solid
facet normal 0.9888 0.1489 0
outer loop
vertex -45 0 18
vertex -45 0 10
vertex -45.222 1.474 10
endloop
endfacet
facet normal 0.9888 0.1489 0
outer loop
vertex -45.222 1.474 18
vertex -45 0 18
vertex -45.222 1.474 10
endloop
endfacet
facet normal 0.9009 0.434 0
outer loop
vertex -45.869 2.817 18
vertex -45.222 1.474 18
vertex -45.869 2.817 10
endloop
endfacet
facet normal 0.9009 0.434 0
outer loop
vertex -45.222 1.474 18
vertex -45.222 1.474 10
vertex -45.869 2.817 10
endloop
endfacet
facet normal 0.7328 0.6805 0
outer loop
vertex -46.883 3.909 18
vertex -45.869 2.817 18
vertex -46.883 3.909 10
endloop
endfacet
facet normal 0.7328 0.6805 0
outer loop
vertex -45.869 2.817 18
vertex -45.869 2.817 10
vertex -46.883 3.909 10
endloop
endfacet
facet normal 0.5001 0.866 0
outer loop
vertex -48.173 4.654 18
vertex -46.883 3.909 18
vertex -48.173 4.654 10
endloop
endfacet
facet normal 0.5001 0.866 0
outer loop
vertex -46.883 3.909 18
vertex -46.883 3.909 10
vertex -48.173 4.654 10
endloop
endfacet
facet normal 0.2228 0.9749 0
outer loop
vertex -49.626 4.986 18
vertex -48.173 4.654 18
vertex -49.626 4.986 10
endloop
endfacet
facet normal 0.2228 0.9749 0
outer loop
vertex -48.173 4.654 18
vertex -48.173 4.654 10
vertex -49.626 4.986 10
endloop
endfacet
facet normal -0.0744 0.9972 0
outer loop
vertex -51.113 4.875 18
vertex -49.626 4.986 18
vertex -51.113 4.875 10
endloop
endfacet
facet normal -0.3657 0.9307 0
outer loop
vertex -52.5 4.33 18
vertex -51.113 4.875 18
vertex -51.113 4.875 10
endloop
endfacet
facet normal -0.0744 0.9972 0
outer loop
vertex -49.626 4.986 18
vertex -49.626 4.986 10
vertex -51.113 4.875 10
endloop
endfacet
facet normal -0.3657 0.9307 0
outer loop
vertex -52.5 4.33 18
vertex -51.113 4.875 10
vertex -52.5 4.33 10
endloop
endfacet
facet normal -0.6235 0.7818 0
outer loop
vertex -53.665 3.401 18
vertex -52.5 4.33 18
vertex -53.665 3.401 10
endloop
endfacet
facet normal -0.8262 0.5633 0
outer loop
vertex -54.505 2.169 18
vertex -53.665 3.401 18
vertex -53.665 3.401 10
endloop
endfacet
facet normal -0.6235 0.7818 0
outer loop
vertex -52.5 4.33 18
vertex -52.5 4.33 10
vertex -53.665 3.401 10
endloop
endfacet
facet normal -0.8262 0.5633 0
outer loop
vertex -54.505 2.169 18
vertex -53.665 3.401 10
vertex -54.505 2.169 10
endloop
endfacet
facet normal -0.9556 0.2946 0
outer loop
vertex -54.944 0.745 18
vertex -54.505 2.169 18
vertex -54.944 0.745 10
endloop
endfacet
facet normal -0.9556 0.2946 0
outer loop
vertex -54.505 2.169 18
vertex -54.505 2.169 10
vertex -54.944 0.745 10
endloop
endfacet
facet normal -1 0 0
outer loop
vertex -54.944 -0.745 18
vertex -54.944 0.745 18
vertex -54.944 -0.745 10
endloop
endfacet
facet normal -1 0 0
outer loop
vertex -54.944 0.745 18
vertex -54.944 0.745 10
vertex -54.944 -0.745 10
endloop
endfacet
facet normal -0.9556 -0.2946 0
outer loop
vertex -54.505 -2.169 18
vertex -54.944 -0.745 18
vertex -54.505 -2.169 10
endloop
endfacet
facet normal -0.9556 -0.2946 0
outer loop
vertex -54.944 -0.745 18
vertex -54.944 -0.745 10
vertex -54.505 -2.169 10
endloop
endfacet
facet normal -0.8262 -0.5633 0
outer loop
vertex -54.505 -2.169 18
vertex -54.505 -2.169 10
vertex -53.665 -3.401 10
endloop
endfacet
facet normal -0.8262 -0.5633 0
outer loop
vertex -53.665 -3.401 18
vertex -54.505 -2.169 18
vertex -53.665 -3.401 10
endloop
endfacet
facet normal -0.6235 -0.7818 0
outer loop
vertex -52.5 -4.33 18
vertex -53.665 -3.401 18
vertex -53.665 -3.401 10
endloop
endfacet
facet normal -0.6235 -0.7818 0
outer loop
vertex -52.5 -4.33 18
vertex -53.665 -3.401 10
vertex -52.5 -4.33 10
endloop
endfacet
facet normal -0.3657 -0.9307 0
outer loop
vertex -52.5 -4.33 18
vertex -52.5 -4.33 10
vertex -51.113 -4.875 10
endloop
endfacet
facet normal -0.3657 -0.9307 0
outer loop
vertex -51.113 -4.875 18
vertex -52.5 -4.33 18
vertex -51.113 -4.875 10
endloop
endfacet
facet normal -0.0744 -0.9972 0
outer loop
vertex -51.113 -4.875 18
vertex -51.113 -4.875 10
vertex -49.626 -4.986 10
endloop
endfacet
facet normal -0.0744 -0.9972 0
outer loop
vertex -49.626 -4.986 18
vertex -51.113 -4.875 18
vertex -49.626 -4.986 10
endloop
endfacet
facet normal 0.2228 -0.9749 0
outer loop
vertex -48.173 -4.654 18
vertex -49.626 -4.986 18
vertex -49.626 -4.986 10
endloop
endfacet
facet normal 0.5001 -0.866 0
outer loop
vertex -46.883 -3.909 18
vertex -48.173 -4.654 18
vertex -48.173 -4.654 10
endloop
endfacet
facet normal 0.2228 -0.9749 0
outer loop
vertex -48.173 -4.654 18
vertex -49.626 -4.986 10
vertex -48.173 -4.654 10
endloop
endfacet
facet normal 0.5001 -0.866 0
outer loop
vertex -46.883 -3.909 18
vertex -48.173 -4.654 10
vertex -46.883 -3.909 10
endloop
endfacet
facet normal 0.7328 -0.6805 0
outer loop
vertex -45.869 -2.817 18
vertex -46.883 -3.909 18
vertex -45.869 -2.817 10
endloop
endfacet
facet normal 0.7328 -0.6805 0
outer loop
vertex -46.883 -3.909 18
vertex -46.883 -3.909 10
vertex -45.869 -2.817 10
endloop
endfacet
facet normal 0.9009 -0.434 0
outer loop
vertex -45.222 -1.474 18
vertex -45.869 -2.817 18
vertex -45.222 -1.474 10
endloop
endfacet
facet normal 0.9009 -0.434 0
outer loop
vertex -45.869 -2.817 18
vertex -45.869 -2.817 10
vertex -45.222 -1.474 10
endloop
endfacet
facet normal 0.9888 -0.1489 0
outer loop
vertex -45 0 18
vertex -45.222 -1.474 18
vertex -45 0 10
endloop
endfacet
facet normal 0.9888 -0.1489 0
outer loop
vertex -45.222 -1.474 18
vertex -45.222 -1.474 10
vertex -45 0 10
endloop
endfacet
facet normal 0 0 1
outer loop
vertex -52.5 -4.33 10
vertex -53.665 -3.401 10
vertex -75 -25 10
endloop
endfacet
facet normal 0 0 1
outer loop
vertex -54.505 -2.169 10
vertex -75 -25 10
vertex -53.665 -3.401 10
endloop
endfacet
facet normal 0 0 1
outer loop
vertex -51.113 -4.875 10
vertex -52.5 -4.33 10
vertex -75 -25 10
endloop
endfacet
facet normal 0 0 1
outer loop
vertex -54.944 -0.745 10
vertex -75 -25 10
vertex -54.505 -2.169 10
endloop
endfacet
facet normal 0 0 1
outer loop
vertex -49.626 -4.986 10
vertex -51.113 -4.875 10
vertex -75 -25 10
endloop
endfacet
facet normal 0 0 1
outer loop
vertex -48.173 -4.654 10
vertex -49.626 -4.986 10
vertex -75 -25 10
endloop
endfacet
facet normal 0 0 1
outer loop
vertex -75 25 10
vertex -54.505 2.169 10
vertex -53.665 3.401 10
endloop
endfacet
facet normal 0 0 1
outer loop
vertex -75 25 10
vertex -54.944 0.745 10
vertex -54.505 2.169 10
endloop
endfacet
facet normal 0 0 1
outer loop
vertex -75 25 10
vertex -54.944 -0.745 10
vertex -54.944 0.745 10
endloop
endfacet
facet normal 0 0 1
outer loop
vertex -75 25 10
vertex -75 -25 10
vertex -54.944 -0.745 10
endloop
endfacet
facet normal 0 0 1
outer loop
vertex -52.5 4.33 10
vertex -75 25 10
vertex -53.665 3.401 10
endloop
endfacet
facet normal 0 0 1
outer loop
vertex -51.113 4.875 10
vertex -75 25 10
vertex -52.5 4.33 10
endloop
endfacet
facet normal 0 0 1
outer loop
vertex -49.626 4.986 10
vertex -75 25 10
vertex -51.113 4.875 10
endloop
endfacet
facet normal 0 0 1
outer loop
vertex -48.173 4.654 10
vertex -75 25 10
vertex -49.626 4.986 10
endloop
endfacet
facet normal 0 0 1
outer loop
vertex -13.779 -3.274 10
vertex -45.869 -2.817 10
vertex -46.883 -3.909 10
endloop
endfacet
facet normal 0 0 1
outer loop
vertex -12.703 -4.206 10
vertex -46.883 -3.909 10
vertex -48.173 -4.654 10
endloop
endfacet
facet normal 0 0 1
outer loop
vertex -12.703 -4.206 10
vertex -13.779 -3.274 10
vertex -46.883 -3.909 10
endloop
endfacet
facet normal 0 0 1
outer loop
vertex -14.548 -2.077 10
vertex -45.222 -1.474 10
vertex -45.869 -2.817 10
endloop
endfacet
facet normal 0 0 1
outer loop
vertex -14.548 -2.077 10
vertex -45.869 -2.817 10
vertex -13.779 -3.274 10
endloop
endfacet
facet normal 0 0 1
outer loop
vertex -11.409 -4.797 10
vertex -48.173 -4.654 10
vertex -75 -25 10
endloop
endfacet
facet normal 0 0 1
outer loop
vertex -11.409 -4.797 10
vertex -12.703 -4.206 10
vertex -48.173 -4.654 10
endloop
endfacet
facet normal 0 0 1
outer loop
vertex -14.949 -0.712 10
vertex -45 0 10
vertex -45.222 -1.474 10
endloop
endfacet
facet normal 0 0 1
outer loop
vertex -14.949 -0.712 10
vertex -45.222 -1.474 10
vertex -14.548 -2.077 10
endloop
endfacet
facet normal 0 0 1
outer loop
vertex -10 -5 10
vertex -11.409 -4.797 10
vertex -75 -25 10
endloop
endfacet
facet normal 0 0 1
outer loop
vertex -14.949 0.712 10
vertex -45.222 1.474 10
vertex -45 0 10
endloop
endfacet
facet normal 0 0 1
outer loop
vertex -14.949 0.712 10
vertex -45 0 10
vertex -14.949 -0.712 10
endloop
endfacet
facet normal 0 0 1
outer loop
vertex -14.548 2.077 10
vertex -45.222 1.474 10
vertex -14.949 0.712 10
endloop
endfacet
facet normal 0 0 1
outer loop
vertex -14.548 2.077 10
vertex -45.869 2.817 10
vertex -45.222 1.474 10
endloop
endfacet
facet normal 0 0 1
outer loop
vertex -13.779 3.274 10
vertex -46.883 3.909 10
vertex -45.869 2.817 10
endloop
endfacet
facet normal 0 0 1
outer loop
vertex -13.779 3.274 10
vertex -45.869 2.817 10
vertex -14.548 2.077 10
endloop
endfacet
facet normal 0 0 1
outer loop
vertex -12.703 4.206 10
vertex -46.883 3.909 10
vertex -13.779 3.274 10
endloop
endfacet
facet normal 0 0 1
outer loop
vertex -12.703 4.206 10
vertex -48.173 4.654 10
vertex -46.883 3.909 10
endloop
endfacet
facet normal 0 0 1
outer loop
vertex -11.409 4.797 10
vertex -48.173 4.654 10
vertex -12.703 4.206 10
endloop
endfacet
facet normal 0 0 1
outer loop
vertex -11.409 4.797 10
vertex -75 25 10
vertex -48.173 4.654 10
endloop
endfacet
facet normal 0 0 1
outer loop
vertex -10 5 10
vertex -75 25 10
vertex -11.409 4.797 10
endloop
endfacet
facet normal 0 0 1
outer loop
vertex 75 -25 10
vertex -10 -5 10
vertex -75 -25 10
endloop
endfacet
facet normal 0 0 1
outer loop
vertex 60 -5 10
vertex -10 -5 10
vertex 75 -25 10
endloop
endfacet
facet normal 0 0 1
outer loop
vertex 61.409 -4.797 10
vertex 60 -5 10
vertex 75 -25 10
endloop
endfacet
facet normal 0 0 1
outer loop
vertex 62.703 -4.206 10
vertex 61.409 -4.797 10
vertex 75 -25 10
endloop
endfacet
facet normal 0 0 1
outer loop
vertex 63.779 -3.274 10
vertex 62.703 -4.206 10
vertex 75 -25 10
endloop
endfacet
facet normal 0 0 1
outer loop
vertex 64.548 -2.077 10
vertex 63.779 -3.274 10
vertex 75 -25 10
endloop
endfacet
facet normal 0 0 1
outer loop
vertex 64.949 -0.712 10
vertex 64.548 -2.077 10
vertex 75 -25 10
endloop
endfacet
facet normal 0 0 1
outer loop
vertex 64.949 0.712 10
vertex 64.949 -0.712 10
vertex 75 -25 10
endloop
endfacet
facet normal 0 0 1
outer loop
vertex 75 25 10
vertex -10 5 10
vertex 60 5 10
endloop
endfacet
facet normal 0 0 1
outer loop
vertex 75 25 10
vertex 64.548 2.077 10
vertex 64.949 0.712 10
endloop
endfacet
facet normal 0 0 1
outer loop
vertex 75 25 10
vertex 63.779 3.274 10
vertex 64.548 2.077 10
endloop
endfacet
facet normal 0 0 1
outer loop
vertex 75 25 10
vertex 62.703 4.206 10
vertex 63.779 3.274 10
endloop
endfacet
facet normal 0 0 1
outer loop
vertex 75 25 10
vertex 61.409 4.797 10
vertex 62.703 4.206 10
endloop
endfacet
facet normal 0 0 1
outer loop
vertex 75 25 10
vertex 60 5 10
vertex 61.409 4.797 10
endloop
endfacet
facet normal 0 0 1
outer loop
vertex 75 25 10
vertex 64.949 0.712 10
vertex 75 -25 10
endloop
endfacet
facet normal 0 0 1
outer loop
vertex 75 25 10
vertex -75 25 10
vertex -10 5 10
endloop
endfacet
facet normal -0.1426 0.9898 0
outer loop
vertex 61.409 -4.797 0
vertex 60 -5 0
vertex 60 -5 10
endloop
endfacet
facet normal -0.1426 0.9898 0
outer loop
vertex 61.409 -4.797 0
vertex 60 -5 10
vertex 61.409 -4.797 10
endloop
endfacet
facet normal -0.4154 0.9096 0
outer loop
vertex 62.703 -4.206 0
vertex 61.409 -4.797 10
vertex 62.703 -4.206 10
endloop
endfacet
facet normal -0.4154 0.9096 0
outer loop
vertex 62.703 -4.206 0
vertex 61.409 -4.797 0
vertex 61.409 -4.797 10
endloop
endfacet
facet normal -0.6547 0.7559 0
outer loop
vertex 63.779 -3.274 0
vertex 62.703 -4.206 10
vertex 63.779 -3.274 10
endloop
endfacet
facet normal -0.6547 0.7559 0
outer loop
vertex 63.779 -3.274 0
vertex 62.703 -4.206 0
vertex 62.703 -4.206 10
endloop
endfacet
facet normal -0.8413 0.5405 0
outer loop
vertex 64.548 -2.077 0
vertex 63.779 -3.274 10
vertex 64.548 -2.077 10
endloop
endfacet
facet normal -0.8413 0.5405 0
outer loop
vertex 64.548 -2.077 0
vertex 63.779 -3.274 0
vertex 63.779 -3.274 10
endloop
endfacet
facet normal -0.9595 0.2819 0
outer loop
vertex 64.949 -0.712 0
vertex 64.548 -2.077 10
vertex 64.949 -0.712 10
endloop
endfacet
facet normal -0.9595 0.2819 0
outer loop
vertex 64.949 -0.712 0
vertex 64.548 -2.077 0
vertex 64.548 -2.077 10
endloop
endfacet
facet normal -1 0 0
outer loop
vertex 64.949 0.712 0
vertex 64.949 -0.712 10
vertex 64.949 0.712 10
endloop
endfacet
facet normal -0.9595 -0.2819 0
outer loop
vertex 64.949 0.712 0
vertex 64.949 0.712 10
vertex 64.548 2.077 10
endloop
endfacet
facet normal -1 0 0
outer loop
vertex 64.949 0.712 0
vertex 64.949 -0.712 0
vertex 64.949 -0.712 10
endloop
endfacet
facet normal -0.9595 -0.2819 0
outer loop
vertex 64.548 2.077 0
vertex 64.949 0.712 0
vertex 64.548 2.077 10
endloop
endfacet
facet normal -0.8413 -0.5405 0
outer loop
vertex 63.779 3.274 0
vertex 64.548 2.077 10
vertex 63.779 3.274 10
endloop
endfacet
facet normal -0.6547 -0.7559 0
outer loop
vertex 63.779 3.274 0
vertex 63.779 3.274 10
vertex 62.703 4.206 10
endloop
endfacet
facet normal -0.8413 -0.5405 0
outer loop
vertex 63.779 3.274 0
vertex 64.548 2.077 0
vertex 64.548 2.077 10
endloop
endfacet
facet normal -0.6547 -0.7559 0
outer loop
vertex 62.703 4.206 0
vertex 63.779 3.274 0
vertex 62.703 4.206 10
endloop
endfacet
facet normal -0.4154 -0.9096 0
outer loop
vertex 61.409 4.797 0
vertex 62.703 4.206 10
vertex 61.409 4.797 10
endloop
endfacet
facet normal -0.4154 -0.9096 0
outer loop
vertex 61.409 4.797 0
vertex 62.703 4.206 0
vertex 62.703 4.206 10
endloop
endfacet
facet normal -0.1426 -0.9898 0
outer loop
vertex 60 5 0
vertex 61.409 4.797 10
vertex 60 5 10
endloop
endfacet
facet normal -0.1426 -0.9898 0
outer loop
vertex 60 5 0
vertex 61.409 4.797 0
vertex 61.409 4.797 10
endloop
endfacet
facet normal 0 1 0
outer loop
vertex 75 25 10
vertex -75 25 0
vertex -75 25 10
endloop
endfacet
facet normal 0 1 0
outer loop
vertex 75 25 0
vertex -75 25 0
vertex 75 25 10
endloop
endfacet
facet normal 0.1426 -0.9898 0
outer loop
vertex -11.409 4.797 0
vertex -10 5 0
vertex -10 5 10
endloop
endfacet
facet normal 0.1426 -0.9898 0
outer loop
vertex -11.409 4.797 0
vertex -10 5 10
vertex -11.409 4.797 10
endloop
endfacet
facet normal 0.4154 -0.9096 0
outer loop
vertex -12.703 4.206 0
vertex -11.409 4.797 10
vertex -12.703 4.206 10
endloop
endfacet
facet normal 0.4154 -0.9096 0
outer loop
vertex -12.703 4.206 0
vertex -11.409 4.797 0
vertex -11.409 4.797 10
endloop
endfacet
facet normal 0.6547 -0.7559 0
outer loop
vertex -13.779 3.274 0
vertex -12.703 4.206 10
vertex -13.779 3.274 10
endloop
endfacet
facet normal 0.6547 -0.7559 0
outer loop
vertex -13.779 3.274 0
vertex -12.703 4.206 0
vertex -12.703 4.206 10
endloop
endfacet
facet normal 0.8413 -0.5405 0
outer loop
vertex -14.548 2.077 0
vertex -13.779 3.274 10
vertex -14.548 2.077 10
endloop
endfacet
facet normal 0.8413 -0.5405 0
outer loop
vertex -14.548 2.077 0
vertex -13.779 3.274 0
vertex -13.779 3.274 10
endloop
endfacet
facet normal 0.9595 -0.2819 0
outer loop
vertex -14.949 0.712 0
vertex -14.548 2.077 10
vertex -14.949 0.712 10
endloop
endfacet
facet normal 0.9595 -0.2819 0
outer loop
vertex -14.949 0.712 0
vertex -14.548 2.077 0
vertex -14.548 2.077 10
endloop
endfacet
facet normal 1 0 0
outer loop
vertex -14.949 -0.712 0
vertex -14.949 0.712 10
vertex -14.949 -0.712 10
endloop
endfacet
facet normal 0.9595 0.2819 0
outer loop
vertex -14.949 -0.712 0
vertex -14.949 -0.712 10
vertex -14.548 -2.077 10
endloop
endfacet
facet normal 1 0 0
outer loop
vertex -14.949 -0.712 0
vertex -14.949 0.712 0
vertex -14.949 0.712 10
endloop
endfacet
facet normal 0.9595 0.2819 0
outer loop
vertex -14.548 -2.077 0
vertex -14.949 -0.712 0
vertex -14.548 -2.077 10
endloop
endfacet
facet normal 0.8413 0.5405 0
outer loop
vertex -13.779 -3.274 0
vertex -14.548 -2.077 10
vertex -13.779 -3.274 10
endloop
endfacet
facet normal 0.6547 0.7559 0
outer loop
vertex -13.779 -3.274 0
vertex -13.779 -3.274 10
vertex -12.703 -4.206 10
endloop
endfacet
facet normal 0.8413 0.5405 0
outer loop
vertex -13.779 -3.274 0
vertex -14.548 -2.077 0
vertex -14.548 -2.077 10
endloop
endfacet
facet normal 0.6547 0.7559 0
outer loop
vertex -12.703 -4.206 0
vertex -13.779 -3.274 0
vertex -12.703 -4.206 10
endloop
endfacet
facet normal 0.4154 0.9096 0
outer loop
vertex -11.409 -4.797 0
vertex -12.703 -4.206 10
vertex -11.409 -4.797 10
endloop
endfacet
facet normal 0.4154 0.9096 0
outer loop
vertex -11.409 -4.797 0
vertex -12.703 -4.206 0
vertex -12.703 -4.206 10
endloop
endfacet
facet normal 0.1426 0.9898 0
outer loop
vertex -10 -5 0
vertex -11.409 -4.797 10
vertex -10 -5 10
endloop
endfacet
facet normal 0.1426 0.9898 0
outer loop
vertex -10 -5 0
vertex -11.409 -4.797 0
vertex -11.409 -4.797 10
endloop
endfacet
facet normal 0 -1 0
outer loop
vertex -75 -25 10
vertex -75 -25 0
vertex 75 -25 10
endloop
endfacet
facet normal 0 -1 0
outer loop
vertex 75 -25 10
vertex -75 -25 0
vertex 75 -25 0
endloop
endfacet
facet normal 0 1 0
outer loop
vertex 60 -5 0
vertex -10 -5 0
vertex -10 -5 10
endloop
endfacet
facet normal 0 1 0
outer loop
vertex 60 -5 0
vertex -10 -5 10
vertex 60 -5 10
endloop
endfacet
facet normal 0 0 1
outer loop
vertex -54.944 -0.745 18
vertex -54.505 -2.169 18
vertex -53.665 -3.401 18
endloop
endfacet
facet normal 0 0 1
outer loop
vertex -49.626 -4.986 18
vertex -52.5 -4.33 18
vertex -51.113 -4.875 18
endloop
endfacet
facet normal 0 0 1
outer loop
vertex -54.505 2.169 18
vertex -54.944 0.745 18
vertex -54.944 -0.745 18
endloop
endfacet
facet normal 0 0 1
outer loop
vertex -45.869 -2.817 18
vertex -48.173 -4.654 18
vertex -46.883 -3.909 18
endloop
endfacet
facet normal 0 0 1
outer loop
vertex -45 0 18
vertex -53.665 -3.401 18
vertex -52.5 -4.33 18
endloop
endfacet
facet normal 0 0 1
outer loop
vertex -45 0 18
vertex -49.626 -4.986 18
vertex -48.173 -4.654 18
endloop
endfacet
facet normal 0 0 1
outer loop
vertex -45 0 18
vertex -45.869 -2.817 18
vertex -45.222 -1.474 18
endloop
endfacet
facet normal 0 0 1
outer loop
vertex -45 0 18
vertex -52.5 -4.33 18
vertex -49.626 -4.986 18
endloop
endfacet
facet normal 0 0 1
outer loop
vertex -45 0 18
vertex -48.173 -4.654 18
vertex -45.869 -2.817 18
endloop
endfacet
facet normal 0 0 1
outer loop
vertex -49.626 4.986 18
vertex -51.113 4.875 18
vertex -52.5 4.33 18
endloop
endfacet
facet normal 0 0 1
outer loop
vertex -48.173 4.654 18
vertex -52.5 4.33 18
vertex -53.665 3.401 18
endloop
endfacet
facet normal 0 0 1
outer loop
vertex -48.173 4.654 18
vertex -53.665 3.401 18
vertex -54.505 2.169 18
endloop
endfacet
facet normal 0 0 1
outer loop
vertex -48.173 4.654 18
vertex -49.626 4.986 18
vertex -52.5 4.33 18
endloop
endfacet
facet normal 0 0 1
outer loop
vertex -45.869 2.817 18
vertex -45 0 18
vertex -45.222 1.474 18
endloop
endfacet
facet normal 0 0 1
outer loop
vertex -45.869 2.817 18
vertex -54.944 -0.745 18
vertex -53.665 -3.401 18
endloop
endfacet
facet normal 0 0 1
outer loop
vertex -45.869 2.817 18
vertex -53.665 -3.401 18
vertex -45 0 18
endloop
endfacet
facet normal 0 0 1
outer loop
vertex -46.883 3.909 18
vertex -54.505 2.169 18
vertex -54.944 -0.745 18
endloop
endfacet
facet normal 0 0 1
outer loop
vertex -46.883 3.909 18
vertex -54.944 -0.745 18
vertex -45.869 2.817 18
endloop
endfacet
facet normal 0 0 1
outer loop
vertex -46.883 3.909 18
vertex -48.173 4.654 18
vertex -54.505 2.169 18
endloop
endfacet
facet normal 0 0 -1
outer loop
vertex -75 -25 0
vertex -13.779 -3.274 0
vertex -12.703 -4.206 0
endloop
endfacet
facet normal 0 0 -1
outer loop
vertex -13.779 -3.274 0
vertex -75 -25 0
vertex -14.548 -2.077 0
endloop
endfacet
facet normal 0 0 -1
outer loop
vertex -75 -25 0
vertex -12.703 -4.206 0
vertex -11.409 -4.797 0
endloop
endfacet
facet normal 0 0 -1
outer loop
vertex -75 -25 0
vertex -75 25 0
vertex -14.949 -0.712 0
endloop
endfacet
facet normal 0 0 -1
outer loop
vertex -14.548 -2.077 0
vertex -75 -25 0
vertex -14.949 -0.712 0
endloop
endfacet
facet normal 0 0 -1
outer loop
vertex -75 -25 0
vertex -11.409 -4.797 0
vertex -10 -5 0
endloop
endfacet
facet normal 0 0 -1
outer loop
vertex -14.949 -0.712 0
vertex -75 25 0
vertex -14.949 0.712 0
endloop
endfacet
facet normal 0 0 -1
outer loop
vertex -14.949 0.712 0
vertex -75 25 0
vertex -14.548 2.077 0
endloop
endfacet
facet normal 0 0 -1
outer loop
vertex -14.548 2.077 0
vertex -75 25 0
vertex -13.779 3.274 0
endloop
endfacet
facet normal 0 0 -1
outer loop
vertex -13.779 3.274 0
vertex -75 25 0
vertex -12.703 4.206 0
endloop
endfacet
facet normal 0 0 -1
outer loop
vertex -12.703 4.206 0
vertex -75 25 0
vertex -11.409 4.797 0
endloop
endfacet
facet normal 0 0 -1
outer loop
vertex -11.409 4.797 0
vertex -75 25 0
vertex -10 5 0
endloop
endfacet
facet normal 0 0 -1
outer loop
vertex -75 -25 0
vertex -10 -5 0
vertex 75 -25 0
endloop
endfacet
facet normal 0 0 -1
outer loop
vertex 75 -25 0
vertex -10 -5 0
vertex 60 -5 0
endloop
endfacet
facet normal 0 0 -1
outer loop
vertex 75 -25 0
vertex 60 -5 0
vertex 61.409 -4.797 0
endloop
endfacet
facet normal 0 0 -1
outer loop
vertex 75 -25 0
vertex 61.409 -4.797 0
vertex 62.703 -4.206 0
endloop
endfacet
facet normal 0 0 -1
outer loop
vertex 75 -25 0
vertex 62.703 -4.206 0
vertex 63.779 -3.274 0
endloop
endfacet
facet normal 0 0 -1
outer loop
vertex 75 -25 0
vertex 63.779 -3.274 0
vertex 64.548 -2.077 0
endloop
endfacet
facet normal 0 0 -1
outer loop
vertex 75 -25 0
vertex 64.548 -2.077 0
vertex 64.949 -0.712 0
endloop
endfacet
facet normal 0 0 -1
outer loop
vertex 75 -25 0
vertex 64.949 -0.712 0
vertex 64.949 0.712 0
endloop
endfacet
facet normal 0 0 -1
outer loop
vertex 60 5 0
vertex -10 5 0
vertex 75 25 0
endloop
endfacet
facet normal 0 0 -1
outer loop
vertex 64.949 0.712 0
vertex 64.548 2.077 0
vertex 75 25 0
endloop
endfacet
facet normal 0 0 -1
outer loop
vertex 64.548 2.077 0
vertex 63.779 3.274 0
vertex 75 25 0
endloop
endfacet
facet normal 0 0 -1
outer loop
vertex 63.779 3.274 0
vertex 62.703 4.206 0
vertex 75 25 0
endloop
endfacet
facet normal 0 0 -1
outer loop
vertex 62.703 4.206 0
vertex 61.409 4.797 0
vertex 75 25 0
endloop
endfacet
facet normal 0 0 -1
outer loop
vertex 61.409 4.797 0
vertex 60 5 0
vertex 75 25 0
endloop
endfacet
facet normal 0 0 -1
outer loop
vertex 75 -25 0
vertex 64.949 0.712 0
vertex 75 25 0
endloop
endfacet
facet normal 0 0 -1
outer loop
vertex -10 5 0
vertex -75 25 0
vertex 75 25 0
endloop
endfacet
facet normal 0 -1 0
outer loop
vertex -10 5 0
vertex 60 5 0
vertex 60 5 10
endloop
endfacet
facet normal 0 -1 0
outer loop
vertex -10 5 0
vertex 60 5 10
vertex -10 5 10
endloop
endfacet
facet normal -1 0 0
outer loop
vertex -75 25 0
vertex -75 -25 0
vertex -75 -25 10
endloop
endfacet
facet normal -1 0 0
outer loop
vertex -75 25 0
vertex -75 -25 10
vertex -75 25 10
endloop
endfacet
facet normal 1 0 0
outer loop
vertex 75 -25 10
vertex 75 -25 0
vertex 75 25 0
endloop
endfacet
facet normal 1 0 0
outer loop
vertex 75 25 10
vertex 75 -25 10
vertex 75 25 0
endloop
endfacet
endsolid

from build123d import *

# Parameters (mm, degrees)
CROQUIS3_W              = 150
CROQUIS3_H              = 50
SALIENTE_EXTRUIR3_DEPTH = 10
CROQUIS4_R              = 5
SALIENTE_EXTRUIR4_DEPTH = 8


with BuildPart() as part:
    # Croquis3 → Saliente-Extruir3 (new body)
    with BuildSketch(Plane.XY):
        Rectangle(CROQUIS3_W, CROQUIS3_H)
        with BuildLine():
            Line((60, 5), (-10, 5))
            ThreePointArc((-10, 5), (-15, 0), (-10, -5))
            Line((-10, -5), (60, -5))
            ThreePointArc((60, -5), (65, 0), (60, 5))
        make_face(mode=Mode.SUBTRACT)
    extrude(amount=SALIENTE_EXTRUIR3_DEPTH)

    # Croquis4 → Saliente-Extruir4 (add)
    with BuildSketch(Plane.XY.offset(10)):
        with Locations((-50, 0)):
            Circle(CROQUIS4_R)
    extrude(amount=SALIENTE_EXTRUIR4_DEPTH)


solid = part.part
